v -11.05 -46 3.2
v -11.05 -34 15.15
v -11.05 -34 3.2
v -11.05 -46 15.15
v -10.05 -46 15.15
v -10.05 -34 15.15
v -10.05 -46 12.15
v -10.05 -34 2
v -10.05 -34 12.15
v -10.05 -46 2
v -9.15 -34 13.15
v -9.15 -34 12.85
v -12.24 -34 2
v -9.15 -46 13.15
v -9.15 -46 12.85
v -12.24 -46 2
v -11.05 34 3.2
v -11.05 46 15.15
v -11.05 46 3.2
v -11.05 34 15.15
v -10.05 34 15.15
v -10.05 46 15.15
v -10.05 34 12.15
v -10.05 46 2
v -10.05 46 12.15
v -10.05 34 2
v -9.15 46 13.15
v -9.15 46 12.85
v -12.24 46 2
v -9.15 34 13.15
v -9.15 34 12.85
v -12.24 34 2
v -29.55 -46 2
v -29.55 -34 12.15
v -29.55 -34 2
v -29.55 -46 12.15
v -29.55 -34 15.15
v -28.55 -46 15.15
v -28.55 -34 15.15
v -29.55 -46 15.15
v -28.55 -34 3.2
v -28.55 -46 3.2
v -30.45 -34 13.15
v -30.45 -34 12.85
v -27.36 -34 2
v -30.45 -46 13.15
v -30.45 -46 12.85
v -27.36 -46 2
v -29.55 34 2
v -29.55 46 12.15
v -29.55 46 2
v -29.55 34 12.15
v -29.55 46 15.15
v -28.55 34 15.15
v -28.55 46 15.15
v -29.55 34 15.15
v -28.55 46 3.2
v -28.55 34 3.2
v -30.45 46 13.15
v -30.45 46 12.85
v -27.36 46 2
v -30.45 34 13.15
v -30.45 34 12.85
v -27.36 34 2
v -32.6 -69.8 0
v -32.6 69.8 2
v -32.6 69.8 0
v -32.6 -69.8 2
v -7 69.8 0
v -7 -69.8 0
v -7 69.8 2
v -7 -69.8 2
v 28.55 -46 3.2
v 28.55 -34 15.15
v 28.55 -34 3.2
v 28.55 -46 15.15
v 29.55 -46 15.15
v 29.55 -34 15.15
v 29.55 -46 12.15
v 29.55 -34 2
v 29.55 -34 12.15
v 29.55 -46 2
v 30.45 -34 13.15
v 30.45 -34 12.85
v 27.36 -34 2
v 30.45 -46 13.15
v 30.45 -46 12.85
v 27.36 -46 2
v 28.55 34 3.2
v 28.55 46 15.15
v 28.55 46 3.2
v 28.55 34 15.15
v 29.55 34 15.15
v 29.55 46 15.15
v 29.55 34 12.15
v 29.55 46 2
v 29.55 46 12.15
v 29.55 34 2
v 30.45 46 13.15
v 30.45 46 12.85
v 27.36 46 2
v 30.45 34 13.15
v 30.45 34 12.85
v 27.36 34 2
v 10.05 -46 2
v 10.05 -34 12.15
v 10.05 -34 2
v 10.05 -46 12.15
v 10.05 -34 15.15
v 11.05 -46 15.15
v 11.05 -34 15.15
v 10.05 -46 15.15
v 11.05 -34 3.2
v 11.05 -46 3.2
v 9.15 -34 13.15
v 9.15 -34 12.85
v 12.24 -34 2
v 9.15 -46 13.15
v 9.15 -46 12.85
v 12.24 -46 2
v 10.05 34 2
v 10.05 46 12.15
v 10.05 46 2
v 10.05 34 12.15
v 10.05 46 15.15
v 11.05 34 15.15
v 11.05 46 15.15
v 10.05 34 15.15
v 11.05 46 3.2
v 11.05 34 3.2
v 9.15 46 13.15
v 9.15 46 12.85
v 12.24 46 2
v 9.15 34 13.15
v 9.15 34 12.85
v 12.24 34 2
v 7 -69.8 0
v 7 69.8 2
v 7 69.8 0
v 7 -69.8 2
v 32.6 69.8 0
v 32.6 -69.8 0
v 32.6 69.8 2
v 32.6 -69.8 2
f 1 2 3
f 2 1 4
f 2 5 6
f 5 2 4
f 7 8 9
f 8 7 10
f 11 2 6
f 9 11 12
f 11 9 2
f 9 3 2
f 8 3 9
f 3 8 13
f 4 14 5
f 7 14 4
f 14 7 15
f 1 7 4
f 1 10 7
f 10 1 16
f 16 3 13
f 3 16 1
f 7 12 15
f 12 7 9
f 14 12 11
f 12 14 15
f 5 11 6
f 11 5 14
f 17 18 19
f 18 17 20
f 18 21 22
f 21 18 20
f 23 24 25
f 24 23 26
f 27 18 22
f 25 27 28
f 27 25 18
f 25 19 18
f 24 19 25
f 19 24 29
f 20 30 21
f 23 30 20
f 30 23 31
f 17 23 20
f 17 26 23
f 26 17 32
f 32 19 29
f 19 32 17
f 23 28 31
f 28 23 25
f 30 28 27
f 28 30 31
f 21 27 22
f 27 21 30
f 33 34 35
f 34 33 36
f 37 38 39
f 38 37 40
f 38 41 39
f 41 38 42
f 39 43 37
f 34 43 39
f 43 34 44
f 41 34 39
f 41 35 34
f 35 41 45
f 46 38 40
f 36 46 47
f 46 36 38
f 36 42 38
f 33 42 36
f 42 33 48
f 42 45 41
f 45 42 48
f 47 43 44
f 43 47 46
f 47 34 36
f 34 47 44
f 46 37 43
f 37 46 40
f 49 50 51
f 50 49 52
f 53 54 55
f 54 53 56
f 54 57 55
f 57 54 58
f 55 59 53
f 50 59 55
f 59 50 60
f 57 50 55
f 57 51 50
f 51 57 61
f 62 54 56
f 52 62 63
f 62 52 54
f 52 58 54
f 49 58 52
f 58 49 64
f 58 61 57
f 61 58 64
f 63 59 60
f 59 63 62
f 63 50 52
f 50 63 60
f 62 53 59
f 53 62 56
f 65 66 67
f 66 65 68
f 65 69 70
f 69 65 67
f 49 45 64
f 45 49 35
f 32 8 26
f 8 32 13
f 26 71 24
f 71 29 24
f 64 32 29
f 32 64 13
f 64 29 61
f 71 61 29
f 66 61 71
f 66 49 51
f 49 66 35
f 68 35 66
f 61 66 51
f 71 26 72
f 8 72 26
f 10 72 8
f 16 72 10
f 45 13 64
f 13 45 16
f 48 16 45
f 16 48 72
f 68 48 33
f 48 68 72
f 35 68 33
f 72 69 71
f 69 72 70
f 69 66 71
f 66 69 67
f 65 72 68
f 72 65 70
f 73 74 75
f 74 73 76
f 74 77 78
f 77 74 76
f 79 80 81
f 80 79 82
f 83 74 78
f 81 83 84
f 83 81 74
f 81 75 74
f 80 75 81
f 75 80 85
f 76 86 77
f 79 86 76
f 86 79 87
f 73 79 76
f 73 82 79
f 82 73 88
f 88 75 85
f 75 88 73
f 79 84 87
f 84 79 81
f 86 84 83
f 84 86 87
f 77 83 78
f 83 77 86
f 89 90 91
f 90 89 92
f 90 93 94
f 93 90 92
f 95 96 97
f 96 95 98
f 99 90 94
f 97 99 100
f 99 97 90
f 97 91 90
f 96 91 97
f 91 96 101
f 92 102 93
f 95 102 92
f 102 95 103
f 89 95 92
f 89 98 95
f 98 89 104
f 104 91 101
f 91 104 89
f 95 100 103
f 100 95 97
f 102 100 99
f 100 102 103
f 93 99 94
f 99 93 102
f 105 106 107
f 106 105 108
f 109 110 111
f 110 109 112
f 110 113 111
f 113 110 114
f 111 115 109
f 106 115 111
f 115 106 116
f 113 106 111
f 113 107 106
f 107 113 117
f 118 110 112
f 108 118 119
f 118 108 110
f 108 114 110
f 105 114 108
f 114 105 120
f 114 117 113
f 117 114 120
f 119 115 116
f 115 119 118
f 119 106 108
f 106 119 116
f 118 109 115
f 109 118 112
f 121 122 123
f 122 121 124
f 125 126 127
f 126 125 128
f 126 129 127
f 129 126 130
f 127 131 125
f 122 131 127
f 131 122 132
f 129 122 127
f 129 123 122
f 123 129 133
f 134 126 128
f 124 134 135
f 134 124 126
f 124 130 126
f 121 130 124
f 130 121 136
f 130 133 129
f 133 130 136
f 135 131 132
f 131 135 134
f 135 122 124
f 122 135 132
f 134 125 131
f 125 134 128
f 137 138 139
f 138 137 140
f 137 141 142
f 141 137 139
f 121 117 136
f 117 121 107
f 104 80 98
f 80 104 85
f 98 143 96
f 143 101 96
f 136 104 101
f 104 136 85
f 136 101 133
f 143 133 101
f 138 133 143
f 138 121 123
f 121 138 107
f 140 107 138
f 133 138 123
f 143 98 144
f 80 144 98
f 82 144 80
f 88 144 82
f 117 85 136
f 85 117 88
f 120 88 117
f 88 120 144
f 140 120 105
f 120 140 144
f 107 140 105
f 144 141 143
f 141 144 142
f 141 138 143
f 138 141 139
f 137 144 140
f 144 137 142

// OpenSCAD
// =============================================================================
// Football field scoreboard - END ZONE INSERT customizer
// Snap-in end zones with flush lettering and an optional outline. Prints face down, clips up,
// no supports. Fits every front (7" Hosyond, 7.9" Waveshare, custom).
//
// MakerWorld: set the colors, hit Generate, and print as one plate.
// Desktop OpenSCAD: set "Output" to "Insert only" and "Letters only" in turn and
// export each as STL. With an outline enabled, also export "Border only".
// Load the exported STLs into the slicer as one object with multiple parts.
// =============================================================================

/* [End zone text] */
// Left end zone (reads bottom to top). Leave empty for a blank insert.
left_text = "HOME";
// Optional second line for the left end zone
left_line_2 = "";
// Right end zone (reads top to bottom). Leave empty for a blank insert.
right_text = "AWAY";
// Optional second line for the right end zone
right_line_2 = "";
// Lettering font (bold fonts read best)
font = "Roboto Condensed:style=Bold"; // font
// Make the lettering bigger or smaller than the automatic fit
text_size_percent = 100; // [60:5:120]

// Outline width in mm, measured outward from the fitted text (0 disables it)
text_border_width = 0.5; // [0:0.1:2]

/* [What to make] */
// Which end zones to put on the plate
part = "both"; // [both:Both end zones, left:Left end zone only, right:Right end zone only, blank:Blank insert (for your own logo)]
// All parts together (MakerWorld), or one part at a time (desktop OpenSCAD export)
output = "all"; // [all:All parts, insert:Insert only, letters:Letters only, border:Border only]
// End zone color
insert_color = "#006778"; // color
// Letter color
letter_color = "#FFFFFF"; // color

// Outline color
border_color = "#000000"; // color

/* [Hidden] */
// ---- sizes: match frame/field_frame.py (the tested print) -------------------
W = 25.6;          // insert width  (end zone 26 mm minus 0.2 mm fit each side)
H = 139.6;         // insert length (140 mm minus fit)
T = 2.0;           // insert thickness = pocket depth
TEXT_D = 0.6;      // letters sink this deep into the face (flush inlay)
TEXT_EDGE = 8.0;   // margin across the width for the lettering
TEXT_END = 12.0;   // margin at the ends of the lettering
CHAR_W = 0.70;     // average letter width / height for the default font (automatic fit; the size slider covers other fonts)
// snap clips (field_frame.py SNAP)
HALF = 10.0;       // half the LED window width the clips sit in
GAP = 0.25; ARM_T = 1.0; ARM_W = 12.0; ARM_Y = 40.0; ROOT = 1.2;
HOOK = 0.9; HOOK_H = 0.7; LEAD = 2.0; RIM_DEPTH = 12.0;
DROP = RIM_DEPTH - T;
ZC = -(DROP + 0.15);                   // top of the hook's catch
ZTIP = ZC - HOOK_H - 0.3 - LEAD;       // clip tip
PLATE_GAP = 14.0;                      // space between two inserts on the plate
$fn = 24;

// ---- one snap clip (installed position: face up at z = T, clips reaching down) ----
module clip(sx, y0) {
    xo = sx * (HALF - GAP);            // arm outer face
    xi = sx * (HALF - GAP - ARM_T);    // arm inner face
    translate([min(xi, xo), y0 - ARM_W / 2, ZTIP]) cube([ARM_T, ARM_W, -ZTIP + 0.01]);
    // gusset at the root (where a clip would crack) and the hook, drawn across the clip width
    translate([0, y0 + ARM_W / 2, 0]) rotate([90, 0, 0]) linear_extrude(ARM_W) {
        polygon([[xi, 0.01], [xi - sx * ROOT, 0.01], [xi, -ROOT]]);
        polygon([[xo, ZC], [xo + sx * HOOK, ZC - HOOK_H], [xo + sx * HOOK, ZC - HOOK_H - 0.3],
                 [xo, ZTIP], [xo - sx * 0.3, ZTIP], [xo - sx * 0.3, ZC]]);
    }
}

// ---- lettering, flat, along X, auto-fitted to the insert ---------------------
function fit_len(t, hmax) = min(H - TEXT_END, hmax * CHAR_W * len(t)) * text_size_percent / 100;

module line2d(t, hmax) {
    if (len(t) > 0)
        resize([fit_len(t, hmax), 0], auto = true)
            text(t, font = font, halign = "center", valign = "center");
}

module lettering2d(t1, t2) {
    if (len(t2) == 0) {
        line2d(t1, W - TEXT_EDGE);
    } else {
        hmax = (W - TEXT_EDGE - 2) / 2;
        translate([0, (hmax + 2) / 2]) line2d(t1, hmax);
        translate([0, -(hmax + 2) / 2]) line2d(t2, hmax);
    }
}

// letters as installed: the top TEXT_D of the insert face (extra = how far above the face to reach, for cutting)
module letters_installed(side, t1, t2, extra = 0, outline = false) {
    translate([0, 0, T - TEXT_D])
        linear_extrude(TEXT_D + extra)
            rotate([0, 0, side == "left" ? 90 : -90]) {
                if (outline && text_border_width > 0)
                    offset(r = text_border_width) lettering2d(t1, t2);
                else
                    lettering2d(t1, t2);
            }
}

module plate() { translate([-W / 2, -H / 2, 0]) cube([W, H, T]); }

module insert_installed(side, t1, t2) {
    difference() {
        union() {
            plate();
            for (sx = [-1, 1]) for (sy = [-1, 1]) clip(sx, sy * ARM_Y);
        }
        if (len(t1) + len(t2) > 0) letters_installed(side, t1, t2, extra = 1, outline = true);
    }
}

module inlay_installed(side, t1, t2) {
    if (len(t1) + len(t2) > 0) intersection() { plate(); letters_installed(side, t1, t2); }
}

module border_installed(side, t1, t2) {
    if (text_border_width > 0 && len(t1) + len(t2) > 0)
        intersection() {
            plate();
            difference() {
                letters_installed(side, t1, t2, outline = true);
                translate([0, 0, -0.01]) letters_installed(side, t1, t2, extra = 0.02);
            }
        }
}

// installed -> printed: face down on the bed, clips up (text comes out mirrored, reads right once flipped)
module face_down() { translate([0, 0, T]) rotate([0, 180, 0]) children(); }

module end_zone(side) {
    t1 = side == "left" ? left_text : side == "right" ? right_text : "";
    t2 = side == "left" ? left_line_2 : side == "right" ? right_line_2 : "";
    face_down() {
        if (output == "all" || output == "insert") color(insert_color) insert_installed(side, t1, t2);
        if (output == "all" || output == "letters") color(letter_color) inlay_installed(side, t1, t2);
        if (output == "all" || output == "border") color(border_color) border_installed(side, t1, t2);
    }
}

sides = part == "both" ? ["left", "right"] : [part];
for (i = [0 : len(sides) - 1])
    translate([len(sides) == 2 ? (i == 0 ? -1 : 1) * (W + PLATE_GAP) / 2 : 0, 0, 0]) end_zone(sides[i]);
